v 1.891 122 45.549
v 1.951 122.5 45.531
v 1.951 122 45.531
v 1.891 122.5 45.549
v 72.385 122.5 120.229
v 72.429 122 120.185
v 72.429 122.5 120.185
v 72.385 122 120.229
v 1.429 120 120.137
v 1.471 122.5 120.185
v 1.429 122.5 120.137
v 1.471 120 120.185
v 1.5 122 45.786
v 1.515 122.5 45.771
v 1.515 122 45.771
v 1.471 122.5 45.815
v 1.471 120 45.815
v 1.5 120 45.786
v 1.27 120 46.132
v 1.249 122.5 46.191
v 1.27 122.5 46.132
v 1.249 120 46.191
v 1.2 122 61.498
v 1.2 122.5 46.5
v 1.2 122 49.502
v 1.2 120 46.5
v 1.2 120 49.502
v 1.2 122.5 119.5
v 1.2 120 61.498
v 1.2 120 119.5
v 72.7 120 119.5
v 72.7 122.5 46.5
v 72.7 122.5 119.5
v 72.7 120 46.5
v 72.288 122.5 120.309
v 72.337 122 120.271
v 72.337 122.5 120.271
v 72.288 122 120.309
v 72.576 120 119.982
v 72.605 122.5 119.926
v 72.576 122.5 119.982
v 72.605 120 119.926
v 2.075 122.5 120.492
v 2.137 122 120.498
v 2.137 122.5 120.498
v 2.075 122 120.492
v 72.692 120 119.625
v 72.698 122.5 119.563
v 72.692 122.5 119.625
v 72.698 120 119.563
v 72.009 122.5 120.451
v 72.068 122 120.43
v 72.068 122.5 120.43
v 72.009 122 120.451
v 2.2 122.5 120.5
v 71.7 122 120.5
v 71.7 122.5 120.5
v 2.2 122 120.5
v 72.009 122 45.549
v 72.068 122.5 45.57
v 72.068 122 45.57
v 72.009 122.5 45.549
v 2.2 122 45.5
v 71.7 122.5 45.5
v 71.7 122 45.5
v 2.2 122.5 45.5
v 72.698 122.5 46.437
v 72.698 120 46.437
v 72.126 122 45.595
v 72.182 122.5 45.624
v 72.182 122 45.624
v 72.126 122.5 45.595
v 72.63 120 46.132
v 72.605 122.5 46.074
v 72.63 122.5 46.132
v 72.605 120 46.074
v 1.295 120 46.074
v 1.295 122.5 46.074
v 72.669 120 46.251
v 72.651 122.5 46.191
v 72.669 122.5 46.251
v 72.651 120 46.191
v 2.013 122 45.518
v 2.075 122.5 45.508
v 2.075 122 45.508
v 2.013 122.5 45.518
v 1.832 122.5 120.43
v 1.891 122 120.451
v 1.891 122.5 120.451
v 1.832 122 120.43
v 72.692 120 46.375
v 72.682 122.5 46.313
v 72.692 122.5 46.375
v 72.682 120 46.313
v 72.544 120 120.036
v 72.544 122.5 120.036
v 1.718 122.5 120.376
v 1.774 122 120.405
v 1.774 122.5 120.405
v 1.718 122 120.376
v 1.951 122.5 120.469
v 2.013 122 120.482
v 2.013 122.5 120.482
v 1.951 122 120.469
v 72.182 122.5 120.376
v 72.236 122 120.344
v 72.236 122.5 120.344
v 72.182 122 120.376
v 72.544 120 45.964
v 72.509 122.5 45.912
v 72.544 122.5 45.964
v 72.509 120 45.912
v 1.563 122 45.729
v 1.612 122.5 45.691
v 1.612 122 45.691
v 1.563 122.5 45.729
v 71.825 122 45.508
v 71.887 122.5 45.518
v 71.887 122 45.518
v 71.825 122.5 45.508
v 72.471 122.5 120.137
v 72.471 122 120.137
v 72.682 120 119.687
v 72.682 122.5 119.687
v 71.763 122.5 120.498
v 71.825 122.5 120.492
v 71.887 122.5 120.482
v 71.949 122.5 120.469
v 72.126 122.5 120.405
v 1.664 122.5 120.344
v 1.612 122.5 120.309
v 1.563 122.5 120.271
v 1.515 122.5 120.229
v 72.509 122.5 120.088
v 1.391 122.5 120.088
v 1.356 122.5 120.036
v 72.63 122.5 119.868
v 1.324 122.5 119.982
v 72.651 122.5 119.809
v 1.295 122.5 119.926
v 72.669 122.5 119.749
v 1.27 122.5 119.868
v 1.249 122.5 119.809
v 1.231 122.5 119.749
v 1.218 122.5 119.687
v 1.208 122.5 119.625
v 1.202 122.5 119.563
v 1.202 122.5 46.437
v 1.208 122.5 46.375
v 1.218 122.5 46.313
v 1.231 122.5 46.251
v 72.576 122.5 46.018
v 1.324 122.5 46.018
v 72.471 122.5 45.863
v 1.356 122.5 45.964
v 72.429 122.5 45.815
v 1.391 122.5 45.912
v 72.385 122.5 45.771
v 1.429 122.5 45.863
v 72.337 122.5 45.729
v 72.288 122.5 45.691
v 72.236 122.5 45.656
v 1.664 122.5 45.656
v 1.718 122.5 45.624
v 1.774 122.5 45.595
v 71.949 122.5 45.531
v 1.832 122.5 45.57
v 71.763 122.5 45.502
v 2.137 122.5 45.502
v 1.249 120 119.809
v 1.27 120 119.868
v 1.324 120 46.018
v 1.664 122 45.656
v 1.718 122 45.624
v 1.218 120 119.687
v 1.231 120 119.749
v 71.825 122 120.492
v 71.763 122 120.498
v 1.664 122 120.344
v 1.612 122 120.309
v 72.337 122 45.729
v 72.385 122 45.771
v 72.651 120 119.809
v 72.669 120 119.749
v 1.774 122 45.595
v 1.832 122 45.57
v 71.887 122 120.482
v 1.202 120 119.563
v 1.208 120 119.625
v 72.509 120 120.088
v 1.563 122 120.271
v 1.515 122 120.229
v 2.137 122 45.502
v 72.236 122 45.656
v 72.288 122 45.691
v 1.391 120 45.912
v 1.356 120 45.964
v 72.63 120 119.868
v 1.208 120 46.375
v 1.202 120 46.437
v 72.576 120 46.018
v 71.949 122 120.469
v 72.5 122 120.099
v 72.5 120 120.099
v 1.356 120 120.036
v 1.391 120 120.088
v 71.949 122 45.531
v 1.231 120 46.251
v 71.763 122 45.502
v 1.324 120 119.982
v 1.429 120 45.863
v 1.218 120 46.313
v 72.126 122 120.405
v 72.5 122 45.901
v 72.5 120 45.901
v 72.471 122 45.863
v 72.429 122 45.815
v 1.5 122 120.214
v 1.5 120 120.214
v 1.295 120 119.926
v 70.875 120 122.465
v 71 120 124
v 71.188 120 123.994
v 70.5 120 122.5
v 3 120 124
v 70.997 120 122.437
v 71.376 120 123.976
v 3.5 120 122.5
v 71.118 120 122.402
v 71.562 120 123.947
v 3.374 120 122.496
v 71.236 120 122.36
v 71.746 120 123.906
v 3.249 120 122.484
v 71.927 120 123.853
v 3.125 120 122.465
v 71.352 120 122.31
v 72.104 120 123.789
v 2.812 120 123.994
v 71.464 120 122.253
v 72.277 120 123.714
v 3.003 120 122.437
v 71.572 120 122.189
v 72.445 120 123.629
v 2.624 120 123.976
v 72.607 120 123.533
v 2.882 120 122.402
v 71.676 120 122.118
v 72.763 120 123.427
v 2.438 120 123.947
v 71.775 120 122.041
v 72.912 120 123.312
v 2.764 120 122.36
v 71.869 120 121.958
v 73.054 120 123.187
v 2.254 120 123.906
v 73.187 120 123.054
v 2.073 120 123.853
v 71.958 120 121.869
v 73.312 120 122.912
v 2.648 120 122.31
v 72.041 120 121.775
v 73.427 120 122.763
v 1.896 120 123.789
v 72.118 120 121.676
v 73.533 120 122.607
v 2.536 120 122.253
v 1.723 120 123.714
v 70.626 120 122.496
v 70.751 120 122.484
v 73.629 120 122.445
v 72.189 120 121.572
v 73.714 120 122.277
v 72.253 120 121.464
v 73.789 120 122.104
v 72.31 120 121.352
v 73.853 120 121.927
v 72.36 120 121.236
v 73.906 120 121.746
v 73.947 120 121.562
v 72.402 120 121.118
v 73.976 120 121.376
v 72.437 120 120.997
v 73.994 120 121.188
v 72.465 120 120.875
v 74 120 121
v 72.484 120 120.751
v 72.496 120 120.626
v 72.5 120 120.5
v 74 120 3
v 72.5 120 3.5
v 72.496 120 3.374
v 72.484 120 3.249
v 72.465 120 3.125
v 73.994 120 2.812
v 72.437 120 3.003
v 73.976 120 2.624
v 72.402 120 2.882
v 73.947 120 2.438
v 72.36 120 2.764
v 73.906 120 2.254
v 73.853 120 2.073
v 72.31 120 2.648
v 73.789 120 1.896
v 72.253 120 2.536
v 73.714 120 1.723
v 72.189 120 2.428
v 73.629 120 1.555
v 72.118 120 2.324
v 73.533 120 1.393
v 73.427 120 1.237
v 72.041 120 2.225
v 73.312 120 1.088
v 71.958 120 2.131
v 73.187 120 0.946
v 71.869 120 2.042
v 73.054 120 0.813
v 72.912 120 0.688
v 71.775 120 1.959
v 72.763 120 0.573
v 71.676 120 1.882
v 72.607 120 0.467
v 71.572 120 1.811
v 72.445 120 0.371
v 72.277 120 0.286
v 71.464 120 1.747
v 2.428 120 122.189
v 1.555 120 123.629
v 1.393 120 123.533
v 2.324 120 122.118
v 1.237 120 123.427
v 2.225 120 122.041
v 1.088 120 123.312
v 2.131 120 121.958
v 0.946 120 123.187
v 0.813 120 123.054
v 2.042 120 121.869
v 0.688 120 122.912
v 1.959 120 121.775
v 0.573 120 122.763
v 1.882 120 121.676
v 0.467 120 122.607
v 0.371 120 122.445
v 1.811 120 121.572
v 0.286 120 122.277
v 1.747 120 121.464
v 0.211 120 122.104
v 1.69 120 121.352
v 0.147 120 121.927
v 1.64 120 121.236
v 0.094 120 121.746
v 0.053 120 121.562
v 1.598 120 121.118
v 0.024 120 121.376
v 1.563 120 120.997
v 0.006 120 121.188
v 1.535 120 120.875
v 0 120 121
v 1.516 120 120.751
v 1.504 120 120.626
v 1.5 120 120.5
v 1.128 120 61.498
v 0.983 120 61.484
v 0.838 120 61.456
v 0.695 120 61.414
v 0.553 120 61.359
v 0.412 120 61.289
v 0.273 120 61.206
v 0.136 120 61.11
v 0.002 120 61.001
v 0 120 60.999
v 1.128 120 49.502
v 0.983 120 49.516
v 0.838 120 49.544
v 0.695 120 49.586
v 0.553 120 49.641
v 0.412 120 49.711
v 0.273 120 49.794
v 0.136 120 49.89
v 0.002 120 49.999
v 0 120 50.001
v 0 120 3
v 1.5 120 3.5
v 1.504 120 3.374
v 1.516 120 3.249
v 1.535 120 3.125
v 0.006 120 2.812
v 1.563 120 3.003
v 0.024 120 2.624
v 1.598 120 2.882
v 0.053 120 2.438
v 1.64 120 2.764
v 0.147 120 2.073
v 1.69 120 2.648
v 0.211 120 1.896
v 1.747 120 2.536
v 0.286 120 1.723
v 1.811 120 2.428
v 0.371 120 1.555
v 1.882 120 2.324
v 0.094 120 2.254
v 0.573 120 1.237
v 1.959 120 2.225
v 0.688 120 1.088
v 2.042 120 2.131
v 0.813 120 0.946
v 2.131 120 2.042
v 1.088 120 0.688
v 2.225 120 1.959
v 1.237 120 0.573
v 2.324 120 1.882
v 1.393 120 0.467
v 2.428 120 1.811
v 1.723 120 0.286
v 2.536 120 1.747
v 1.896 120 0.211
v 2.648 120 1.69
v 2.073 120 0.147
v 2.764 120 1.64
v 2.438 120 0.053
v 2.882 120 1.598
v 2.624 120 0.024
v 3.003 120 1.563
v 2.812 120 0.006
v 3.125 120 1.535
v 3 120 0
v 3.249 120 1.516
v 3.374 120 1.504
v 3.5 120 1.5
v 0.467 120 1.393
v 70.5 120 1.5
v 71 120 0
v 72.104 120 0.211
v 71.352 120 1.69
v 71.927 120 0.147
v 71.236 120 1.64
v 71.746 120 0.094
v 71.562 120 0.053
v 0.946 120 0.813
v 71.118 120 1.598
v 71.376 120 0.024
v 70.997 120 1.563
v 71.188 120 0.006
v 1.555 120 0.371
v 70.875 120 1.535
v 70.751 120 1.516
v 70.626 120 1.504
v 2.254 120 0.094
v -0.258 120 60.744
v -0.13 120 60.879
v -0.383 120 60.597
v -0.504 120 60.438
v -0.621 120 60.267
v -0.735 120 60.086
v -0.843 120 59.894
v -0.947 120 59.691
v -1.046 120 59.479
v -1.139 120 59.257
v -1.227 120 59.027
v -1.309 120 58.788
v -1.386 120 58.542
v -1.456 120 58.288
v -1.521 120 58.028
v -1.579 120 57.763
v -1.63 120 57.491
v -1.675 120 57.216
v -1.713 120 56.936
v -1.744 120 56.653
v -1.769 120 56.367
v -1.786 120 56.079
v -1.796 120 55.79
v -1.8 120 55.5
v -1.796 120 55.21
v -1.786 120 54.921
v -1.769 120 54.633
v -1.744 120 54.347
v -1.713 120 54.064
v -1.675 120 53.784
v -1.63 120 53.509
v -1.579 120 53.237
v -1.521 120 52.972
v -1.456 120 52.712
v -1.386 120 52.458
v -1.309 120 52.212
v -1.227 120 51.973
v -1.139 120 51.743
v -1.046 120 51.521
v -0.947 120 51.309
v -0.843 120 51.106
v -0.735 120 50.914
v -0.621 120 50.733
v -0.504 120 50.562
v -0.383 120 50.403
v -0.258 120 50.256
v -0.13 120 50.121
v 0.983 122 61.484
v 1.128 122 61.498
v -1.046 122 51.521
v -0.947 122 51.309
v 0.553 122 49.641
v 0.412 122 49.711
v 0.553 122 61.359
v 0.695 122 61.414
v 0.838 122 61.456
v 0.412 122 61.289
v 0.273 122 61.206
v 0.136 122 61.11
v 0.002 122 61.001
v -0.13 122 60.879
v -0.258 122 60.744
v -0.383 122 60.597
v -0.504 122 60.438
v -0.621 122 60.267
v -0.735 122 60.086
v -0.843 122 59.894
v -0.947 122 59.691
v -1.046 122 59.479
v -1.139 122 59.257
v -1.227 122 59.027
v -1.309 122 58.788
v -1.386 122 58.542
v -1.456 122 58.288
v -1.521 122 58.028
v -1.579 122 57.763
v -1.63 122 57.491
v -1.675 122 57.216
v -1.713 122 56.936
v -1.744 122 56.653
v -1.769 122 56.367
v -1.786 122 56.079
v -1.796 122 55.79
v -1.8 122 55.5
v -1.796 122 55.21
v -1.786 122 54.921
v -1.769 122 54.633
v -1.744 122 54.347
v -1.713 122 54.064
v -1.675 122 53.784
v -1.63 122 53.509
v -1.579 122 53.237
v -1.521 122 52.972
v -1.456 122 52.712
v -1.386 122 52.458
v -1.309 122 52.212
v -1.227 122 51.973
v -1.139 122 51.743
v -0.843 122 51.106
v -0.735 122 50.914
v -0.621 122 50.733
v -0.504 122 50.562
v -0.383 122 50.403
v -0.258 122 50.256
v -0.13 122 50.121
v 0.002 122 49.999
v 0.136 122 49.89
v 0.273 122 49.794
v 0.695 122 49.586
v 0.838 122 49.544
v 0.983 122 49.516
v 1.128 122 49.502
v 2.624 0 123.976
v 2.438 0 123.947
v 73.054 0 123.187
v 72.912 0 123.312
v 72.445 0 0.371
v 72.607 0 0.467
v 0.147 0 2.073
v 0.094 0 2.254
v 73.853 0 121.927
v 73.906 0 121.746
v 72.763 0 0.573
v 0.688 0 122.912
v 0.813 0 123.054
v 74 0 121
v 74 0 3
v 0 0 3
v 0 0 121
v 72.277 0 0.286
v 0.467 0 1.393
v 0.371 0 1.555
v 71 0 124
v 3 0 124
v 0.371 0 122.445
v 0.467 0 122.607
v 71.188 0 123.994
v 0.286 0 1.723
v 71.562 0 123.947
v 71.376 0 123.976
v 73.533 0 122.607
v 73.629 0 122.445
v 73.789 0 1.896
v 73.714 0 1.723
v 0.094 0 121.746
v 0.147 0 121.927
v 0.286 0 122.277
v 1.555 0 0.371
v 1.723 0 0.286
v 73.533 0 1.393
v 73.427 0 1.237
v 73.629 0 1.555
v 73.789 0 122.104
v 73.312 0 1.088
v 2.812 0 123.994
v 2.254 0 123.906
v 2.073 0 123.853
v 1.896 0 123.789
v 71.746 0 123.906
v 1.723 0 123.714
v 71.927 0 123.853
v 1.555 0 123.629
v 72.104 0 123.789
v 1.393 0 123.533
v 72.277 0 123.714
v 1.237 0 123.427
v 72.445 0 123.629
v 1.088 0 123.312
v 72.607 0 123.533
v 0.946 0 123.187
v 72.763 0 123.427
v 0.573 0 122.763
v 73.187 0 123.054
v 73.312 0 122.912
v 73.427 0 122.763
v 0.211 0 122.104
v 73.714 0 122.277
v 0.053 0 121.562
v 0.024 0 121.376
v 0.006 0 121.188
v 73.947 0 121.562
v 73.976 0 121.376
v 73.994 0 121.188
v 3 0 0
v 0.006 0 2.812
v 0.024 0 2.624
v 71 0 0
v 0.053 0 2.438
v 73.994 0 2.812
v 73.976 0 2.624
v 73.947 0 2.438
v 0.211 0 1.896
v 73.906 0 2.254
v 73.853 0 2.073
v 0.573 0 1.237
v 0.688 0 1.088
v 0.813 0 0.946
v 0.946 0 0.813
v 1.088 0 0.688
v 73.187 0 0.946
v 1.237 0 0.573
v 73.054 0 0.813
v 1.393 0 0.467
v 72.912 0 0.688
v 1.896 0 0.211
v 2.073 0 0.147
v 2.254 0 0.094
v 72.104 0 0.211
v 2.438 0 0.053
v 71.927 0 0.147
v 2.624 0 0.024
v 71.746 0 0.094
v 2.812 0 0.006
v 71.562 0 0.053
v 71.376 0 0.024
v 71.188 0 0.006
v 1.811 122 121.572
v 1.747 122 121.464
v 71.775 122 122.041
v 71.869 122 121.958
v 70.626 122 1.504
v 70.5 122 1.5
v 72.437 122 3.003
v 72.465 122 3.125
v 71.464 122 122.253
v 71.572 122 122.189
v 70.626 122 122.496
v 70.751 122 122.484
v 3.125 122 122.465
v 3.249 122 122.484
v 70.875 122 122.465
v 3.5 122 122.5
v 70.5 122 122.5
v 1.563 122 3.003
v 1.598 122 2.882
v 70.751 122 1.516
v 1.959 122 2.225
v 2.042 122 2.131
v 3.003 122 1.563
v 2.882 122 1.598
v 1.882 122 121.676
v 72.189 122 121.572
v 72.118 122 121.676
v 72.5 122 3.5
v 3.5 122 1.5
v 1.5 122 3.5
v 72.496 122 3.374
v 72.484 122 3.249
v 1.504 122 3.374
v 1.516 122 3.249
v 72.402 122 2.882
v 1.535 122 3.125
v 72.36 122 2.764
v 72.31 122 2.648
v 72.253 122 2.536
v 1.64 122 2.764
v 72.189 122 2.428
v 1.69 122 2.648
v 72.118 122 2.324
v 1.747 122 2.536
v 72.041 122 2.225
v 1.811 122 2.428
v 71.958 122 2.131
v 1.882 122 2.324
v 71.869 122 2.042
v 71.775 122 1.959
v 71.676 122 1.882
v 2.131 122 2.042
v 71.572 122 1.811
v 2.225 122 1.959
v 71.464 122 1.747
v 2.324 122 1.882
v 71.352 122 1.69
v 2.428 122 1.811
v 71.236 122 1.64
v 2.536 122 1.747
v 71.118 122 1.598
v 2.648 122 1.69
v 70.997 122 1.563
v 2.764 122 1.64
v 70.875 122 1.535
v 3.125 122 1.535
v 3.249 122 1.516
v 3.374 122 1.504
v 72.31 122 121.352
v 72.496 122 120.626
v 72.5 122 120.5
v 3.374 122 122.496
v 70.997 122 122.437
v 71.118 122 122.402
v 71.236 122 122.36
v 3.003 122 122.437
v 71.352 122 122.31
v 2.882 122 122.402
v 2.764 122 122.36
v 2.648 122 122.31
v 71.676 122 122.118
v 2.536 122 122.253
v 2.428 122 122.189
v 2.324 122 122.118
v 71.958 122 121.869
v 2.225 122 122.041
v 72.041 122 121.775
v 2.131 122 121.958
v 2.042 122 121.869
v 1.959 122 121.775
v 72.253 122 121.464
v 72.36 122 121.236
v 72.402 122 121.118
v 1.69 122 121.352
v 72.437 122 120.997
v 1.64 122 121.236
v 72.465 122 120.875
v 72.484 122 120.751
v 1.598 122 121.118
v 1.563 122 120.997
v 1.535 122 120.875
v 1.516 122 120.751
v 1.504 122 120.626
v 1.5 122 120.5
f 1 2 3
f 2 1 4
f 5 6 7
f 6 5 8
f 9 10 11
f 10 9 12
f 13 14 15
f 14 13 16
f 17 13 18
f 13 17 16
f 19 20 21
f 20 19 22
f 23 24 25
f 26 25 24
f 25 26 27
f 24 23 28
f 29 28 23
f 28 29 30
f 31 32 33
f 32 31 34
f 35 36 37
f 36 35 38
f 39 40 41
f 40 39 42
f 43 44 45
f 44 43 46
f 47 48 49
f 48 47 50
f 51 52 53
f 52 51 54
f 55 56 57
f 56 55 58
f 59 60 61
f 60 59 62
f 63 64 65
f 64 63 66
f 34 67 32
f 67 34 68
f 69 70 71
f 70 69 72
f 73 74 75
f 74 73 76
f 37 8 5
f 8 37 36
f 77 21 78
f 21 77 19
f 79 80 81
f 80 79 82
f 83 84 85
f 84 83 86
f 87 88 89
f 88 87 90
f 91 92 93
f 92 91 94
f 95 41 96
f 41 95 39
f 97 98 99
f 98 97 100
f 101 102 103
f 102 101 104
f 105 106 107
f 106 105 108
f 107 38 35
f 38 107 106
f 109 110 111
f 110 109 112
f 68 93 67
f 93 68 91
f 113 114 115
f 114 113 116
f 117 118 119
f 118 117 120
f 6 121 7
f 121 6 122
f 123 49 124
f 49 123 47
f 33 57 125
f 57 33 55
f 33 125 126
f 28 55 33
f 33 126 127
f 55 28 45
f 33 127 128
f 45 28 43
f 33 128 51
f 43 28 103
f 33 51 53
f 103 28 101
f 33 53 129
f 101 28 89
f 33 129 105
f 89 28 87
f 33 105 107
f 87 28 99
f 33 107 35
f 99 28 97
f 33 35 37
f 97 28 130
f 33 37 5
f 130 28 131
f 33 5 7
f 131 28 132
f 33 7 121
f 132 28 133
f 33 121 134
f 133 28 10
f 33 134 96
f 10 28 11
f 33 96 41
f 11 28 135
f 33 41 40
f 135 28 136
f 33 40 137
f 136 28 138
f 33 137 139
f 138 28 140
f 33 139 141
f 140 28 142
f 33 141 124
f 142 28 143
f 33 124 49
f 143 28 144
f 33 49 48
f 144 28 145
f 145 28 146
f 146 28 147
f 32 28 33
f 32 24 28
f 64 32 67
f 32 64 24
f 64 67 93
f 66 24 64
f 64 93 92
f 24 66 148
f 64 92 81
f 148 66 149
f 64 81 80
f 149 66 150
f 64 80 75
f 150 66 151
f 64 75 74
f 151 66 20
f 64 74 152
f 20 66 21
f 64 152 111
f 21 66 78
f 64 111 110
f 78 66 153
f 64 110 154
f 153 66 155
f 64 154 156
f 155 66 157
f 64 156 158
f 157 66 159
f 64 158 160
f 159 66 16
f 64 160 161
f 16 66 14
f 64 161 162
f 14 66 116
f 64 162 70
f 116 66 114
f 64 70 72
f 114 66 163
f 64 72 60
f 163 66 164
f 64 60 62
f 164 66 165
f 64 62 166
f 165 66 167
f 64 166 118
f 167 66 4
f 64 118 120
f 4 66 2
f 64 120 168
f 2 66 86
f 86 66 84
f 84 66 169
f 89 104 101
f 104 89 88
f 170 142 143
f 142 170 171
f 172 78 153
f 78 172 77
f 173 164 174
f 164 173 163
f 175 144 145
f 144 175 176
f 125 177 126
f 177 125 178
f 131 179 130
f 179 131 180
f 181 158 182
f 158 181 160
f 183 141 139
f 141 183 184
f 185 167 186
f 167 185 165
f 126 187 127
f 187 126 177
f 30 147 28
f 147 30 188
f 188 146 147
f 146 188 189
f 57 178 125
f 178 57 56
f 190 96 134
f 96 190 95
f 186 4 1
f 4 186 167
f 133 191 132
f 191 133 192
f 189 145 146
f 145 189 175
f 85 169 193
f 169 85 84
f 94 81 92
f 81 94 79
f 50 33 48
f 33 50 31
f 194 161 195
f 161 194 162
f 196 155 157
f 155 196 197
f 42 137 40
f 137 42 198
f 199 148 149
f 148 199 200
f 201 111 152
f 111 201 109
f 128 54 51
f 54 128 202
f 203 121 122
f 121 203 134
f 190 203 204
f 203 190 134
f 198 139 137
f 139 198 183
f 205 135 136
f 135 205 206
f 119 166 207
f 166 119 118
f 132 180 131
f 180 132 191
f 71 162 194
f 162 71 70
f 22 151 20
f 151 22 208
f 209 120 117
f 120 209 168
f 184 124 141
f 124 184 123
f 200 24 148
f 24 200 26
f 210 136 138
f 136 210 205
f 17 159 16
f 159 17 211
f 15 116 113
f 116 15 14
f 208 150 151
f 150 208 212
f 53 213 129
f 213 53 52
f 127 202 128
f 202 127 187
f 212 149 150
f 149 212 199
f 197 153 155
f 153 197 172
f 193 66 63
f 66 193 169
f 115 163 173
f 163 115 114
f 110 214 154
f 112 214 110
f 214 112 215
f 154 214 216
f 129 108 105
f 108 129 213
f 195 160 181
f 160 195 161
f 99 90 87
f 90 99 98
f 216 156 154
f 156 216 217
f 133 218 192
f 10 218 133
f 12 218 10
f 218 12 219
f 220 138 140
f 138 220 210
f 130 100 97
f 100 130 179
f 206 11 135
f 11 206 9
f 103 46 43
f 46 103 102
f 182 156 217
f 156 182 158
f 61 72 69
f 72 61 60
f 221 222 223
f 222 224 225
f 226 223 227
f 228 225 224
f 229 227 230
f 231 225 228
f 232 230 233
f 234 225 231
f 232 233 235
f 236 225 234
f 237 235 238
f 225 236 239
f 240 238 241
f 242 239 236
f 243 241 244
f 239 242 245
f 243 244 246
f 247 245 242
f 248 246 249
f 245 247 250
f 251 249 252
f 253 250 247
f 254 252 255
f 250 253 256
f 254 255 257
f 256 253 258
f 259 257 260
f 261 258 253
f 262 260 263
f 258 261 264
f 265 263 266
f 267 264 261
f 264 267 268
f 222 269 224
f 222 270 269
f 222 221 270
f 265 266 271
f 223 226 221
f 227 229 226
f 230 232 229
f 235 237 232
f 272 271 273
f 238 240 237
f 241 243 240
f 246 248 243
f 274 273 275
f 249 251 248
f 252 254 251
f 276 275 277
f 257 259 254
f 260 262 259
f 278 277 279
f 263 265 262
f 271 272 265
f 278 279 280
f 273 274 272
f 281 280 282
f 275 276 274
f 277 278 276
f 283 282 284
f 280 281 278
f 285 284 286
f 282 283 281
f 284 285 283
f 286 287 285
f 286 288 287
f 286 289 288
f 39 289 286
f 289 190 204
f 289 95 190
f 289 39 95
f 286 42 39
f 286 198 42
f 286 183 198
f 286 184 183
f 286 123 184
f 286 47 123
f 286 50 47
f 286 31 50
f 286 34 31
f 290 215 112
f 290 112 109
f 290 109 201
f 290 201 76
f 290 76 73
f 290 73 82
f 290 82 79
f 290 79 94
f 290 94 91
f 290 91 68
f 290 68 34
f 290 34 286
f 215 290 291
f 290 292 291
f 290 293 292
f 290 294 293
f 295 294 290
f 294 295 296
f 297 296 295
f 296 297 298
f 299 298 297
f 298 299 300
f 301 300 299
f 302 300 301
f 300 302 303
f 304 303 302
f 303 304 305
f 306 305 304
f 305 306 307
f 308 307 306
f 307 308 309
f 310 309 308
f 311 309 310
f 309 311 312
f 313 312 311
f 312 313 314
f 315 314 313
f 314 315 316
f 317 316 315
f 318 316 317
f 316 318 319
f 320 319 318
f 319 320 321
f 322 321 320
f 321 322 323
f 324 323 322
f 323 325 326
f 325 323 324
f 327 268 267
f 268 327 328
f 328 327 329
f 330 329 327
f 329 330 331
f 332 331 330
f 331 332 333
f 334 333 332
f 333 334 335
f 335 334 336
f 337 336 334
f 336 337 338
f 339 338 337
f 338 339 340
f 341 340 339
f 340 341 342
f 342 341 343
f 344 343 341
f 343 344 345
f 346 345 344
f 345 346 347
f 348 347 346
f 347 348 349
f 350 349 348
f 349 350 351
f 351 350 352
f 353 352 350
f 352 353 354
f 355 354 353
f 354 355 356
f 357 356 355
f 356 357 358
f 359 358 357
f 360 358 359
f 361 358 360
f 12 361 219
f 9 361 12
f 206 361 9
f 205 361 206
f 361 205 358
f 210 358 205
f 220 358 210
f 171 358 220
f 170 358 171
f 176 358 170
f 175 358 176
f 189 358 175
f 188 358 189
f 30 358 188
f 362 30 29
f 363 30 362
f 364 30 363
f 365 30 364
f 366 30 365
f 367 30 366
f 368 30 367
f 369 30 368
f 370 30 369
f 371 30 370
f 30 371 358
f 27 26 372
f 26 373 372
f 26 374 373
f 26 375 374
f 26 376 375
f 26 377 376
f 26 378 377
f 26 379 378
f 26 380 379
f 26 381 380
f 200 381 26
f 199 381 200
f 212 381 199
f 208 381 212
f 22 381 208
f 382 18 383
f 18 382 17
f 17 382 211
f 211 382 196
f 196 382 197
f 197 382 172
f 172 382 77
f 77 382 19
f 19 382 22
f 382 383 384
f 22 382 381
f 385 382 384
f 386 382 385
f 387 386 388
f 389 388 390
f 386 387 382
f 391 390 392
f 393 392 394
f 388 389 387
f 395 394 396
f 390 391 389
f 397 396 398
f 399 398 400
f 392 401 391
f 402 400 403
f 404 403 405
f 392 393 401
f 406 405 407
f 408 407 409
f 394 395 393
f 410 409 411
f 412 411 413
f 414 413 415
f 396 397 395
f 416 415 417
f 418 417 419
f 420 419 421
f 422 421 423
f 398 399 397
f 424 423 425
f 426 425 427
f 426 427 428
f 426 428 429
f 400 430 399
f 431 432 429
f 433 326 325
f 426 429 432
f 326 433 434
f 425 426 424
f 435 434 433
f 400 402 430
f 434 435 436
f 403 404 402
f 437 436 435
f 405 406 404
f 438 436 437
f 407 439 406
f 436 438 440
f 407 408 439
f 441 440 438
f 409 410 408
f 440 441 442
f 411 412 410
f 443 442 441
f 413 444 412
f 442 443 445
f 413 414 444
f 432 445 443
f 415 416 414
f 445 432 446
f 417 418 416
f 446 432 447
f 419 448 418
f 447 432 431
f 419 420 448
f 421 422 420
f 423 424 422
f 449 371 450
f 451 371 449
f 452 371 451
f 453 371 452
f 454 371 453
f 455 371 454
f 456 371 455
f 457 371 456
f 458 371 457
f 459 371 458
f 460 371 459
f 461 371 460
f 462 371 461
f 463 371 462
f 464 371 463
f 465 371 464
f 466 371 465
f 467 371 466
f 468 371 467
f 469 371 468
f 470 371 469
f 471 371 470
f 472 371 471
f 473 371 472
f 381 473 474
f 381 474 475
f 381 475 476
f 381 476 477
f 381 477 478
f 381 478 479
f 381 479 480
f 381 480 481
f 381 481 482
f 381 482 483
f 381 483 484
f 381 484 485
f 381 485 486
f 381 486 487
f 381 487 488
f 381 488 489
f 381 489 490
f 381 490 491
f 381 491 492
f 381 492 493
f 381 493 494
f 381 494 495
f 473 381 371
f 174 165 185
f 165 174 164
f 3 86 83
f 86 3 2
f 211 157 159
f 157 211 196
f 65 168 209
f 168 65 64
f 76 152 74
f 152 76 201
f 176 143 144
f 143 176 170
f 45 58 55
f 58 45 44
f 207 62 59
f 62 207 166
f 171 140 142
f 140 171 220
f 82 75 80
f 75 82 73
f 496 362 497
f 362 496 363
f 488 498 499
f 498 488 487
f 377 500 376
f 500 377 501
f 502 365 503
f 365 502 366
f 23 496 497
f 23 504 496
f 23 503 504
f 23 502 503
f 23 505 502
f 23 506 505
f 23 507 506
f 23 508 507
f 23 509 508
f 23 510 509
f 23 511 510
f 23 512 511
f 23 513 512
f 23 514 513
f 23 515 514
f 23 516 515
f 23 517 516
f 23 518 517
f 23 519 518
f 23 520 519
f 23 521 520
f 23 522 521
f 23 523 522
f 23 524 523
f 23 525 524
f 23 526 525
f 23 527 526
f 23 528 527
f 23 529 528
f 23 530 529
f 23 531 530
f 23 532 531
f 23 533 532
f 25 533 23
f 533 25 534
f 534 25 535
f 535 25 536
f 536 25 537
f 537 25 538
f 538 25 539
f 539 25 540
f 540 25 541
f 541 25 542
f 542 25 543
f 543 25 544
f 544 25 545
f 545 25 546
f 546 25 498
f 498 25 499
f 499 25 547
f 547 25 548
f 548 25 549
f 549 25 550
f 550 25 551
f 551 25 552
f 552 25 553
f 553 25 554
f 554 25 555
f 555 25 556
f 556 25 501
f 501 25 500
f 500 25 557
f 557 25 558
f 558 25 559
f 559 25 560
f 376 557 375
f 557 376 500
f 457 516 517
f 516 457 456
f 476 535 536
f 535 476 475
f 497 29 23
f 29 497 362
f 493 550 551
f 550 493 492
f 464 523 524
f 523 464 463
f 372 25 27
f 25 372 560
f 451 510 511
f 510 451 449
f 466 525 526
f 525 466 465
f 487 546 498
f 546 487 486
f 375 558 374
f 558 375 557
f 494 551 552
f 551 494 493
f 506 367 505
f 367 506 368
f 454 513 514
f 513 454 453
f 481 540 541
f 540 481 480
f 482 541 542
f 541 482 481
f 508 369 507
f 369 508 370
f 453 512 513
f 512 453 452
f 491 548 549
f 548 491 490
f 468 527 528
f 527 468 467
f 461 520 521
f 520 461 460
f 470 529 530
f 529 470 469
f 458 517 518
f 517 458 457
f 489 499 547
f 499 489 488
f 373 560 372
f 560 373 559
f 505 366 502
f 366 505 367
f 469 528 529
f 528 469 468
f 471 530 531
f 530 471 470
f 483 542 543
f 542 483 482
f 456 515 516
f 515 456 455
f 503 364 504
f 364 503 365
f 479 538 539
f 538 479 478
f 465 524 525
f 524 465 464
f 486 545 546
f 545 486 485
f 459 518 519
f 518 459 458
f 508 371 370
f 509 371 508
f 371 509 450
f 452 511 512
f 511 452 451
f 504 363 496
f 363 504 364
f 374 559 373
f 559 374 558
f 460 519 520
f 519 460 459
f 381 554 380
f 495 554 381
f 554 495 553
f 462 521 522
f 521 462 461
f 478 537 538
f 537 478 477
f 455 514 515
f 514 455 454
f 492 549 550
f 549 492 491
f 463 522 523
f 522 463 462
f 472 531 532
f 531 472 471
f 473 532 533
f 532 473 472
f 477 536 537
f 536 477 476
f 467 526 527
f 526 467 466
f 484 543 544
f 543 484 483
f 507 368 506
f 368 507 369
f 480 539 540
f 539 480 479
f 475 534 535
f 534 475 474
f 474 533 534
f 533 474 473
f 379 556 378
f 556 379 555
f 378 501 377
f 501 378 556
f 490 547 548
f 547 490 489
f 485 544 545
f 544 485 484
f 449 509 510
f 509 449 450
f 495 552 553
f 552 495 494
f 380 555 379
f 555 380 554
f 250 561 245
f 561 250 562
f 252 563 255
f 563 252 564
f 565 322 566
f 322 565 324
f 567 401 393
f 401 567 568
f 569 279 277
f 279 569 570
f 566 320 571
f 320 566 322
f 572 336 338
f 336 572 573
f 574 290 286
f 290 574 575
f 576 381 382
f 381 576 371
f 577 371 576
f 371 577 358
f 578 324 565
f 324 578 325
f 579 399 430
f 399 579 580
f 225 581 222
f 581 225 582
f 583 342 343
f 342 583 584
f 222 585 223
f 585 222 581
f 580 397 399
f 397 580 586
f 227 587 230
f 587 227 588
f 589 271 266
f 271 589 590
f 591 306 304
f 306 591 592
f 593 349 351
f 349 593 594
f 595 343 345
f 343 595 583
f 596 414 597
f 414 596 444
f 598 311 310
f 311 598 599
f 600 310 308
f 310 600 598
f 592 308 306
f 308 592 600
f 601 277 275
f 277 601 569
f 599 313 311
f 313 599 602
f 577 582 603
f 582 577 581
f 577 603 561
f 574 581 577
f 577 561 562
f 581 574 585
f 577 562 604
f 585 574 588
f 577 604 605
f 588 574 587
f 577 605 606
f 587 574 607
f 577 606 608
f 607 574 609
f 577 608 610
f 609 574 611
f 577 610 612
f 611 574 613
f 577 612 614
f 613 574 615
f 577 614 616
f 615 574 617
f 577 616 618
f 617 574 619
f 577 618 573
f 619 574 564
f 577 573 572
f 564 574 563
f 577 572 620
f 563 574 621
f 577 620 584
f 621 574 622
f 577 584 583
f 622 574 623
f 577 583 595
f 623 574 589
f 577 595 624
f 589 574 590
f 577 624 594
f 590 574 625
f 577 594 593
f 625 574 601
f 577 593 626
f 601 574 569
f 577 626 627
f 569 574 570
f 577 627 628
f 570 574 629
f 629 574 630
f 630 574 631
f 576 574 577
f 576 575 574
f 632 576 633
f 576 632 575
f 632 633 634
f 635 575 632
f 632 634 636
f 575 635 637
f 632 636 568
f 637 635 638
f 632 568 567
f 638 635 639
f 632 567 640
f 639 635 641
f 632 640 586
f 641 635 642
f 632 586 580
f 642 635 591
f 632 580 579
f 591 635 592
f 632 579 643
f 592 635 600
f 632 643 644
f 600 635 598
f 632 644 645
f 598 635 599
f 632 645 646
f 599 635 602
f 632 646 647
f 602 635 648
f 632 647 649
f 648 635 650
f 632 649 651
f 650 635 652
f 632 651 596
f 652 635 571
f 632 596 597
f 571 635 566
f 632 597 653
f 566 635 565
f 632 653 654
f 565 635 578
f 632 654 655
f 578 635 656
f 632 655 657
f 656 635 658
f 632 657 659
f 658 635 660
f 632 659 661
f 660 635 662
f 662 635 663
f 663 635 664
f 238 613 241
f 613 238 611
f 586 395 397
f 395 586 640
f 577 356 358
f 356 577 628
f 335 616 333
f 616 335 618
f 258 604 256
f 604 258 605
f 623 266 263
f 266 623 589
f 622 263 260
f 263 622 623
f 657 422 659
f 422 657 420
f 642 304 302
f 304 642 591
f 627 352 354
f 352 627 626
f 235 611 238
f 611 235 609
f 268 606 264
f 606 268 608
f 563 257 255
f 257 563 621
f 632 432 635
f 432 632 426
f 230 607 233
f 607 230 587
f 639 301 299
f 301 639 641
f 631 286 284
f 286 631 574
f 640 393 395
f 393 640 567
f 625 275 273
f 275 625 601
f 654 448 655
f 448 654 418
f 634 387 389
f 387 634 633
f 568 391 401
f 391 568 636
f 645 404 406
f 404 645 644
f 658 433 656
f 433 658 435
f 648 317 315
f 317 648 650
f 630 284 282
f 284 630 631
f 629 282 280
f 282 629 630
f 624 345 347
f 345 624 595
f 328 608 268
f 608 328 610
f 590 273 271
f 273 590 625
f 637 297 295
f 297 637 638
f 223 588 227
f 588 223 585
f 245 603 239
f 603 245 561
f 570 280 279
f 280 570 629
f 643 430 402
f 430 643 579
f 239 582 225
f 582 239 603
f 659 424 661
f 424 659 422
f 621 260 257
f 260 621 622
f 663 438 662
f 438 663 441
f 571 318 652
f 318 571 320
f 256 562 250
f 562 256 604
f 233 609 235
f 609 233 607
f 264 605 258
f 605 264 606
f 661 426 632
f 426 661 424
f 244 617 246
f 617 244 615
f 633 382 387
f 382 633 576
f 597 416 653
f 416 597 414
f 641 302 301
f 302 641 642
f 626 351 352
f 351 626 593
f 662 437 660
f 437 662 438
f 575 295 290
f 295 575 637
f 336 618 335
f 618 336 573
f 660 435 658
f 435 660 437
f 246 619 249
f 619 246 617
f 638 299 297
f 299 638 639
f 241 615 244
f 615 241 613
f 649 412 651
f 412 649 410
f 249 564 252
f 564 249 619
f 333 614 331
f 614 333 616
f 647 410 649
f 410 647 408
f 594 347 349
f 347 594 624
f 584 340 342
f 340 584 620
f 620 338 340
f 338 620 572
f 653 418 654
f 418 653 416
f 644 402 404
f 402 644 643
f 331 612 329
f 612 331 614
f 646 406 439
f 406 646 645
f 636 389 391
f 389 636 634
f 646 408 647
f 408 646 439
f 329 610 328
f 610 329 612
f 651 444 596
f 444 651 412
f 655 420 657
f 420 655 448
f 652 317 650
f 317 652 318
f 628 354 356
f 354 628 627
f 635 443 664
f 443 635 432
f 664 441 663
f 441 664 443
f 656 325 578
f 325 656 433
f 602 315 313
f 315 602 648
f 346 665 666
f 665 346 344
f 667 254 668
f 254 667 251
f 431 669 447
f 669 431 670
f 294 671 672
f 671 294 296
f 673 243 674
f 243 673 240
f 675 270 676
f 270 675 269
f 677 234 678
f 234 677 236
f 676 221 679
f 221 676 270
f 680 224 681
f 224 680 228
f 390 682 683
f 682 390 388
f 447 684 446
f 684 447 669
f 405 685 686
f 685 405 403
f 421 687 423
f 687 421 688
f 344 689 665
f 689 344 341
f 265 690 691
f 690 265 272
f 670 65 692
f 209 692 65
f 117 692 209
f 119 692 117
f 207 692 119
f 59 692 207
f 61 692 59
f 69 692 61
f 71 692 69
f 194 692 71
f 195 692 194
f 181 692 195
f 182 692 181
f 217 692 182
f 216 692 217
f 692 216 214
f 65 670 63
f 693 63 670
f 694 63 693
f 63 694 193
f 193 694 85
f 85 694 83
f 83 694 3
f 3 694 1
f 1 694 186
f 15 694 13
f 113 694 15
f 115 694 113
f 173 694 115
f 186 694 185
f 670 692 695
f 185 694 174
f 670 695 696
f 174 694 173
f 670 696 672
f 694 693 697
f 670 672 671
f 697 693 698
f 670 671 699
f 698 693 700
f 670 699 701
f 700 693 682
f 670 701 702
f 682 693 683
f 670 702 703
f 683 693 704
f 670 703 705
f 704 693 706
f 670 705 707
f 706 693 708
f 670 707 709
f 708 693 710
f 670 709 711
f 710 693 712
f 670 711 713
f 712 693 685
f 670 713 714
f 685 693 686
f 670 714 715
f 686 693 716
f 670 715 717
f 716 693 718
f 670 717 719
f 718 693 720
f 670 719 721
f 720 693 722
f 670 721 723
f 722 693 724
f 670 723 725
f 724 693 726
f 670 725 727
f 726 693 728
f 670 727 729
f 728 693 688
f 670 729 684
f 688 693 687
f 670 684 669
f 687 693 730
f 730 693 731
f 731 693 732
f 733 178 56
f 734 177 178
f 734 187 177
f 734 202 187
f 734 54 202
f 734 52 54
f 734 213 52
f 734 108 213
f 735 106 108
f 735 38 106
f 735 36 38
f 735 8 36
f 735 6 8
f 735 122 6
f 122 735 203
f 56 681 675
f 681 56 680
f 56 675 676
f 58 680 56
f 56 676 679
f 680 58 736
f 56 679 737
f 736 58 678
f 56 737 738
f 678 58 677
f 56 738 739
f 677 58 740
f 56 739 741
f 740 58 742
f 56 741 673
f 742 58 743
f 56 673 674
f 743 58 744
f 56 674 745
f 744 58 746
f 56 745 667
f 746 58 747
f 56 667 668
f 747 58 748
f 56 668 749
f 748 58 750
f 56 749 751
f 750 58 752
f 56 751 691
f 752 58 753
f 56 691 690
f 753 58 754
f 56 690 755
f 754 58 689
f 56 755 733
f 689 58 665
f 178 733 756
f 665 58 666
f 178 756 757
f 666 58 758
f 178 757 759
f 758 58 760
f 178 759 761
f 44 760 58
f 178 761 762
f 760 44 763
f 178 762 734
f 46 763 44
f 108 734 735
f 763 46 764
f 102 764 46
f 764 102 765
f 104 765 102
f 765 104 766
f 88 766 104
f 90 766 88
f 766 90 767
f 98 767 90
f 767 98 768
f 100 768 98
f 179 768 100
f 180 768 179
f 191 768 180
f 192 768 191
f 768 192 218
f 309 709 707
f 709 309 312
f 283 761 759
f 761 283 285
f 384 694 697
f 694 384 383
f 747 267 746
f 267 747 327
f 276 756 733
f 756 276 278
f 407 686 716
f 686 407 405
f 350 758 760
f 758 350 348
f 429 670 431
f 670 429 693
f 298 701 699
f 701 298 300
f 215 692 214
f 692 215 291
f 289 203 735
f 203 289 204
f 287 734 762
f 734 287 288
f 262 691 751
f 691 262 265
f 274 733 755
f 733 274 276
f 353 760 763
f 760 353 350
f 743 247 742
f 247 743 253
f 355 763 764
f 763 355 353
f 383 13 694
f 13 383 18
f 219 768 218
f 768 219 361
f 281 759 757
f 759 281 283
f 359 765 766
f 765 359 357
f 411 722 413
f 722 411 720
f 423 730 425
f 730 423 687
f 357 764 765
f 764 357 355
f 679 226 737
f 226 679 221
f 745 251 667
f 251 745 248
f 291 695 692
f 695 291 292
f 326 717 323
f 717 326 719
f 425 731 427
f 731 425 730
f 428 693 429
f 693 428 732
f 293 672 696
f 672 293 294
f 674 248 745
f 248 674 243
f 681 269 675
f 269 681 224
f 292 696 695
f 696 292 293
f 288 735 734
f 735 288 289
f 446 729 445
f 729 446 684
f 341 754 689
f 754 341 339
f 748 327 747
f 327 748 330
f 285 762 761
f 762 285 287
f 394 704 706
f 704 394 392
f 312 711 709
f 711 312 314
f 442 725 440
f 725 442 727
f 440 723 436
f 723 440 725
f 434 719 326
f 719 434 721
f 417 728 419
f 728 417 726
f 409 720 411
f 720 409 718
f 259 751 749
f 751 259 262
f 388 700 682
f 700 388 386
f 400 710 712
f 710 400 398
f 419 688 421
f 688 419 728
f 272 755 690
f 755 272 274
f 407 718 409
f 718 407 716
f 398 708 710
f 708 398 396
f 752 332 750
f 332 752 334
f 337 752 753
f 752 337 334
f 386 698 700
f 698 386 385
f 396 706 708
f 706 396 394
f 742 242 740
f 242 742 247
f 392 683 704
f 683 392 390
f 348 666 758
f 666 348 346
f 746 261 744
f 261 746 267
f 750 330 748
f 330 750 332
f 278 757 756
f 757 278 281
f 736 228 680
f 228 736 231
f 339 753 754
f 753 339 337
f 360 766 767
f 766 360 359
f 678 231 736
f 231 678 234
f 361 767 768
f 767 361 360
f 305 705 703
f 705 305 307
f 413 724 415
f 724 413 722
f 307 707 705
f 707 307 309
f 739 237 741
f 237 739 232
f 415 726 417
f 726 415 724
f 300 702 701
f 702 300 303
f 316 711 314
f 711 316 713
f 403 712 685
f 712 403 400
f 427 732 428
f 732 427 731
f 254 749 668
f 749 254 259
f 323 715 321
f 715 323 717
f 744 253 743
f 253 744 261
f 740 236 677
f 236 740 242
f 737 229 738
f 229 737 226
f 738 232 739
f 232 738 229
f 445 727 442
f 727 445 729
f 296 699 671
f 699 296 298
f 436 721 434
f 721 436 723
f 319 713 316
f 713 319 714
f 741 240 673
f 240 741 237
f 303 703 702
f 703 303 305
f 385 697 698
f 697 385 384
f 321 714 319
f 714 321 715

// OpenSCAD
module rect_redondeado(radio_redondeo, dimensiones = [74, 124, 120]){
    hull(){
        translate([radio_redondeo,0,radio_redondeo])
        rotate([-90,0,0])
        cylinder(h=dimensiones[2], r=radio_redondeo, $fn=100);

        translate([dimensiones[0]-radio_redondeo,0,radio_redondeo])
        rotate([-90,0,0])
        cylinder(h=dimensiones[2], r=radio_redondeo, $fn=100);

        translate([dimensiones[0]-radio_redondeo,0,dimensiones[1]-radio_redondeo])
        rotate([-90,0,0])
        cylinder(h=dimensiones[2], r=radio_redondeo, $fn=100);

        translate([radio_redondeo,0,dimensiones[1]-radio_redondeo])
        rotate([-90,0,0])
        cylinder(h=dimensiones[2], r=radio_redondeo, $fn=100);
    }
}



module tapa(){
        rect_redondeado(radio_redondeo = 1, dimensiones = [71.5, 75, 2.5]);
        translate([0,1,10])
        rotate([90,0,0])
        scale([0.5,1,1])
        cylinder(r=6, h=2, center = true, $fn = 130);
    }

dimensiones = [74, 124, 120];
radio_redondeo = 3;

// cuerpo

    
// // selector rotatorio
// difference() {
//     translate([1.2,120,45.5])
//     hull(){
//         translate([dimensiones[0]/2,3,dimensiones[1]/3])
//         rotate([90,0,0])
//         cylinder(r = 11, h = 1, center = true, $fn = 100);
//         translate([dimensiones[0]/2,12,dimensiones[1]/3])
//         rotate([90,0,0])
//         cylinder(r = 10, h = 1, center = true, $fn = 100);
//     }
//     #translate([dimensiones[0]/2,16.5,dimensiones[1]/3])
//     scale([1,0.5,1])
//     sphere(r = 10, $fn = 100);
// }

// hueco esc
difference() {
    union(){
        //forntal
        translate([1.2,120,45.5])
        tapa();
        rect_redondeado(radio_redondeo = 3, dimensiones = [74, 124, 120]);
        translate([1.5,120,1.5]) 
        rect_redondeado(radio_redondeo = 2, dimensiones = [dimensiones[0]-radio_redondeo, dimensiones[1]-radio_redondeo, 2]);
        translate([dimensiones[0]/2-20,5,dimensiones[1]/3]){
            // hull() {
            //     translate([-3+1.2,118,45.5])
            //     rotate([90,0,0])
            //     cylinder(r=7, h=3, center = true, $fn = 100);
            //     translate([20+1.2,118,45.5])
            //     rotate([90,0,0])
            //     cylinder(r=12, h=3, center = true, $fn = 100);
            // }
            // hull(){
            //     translate([20+1.2,118,45.5])
            //     cube([55.5,3,1.5], center = true);
            //     translate([20+1.2,118,25.5])
            //     cube([53.5,3,1.5], center = true);
            //     translate([20+1.2,118,10.5])
            //     cube([48.5,3,1.5], center = true);
            // }
            // translate([-1,118.2, 31.5])
            // rotate([90,0,0])
            // cylinder(r=7, h=3.5, center = true, $fn = 100);

            // translate([2,118.2, 20.5])
            // rotate([90,0,0])
            // cylinder(r=7, h=3.5, center = true, $fn = 100);
        }
    }

    // translate([1.2,120,45.5]){
    //     translate([dimensiones[0]/2-20-3,5,dimensiones[1]/3])
    //     sphere(r = 6, $fn = 100);
    // }
}
